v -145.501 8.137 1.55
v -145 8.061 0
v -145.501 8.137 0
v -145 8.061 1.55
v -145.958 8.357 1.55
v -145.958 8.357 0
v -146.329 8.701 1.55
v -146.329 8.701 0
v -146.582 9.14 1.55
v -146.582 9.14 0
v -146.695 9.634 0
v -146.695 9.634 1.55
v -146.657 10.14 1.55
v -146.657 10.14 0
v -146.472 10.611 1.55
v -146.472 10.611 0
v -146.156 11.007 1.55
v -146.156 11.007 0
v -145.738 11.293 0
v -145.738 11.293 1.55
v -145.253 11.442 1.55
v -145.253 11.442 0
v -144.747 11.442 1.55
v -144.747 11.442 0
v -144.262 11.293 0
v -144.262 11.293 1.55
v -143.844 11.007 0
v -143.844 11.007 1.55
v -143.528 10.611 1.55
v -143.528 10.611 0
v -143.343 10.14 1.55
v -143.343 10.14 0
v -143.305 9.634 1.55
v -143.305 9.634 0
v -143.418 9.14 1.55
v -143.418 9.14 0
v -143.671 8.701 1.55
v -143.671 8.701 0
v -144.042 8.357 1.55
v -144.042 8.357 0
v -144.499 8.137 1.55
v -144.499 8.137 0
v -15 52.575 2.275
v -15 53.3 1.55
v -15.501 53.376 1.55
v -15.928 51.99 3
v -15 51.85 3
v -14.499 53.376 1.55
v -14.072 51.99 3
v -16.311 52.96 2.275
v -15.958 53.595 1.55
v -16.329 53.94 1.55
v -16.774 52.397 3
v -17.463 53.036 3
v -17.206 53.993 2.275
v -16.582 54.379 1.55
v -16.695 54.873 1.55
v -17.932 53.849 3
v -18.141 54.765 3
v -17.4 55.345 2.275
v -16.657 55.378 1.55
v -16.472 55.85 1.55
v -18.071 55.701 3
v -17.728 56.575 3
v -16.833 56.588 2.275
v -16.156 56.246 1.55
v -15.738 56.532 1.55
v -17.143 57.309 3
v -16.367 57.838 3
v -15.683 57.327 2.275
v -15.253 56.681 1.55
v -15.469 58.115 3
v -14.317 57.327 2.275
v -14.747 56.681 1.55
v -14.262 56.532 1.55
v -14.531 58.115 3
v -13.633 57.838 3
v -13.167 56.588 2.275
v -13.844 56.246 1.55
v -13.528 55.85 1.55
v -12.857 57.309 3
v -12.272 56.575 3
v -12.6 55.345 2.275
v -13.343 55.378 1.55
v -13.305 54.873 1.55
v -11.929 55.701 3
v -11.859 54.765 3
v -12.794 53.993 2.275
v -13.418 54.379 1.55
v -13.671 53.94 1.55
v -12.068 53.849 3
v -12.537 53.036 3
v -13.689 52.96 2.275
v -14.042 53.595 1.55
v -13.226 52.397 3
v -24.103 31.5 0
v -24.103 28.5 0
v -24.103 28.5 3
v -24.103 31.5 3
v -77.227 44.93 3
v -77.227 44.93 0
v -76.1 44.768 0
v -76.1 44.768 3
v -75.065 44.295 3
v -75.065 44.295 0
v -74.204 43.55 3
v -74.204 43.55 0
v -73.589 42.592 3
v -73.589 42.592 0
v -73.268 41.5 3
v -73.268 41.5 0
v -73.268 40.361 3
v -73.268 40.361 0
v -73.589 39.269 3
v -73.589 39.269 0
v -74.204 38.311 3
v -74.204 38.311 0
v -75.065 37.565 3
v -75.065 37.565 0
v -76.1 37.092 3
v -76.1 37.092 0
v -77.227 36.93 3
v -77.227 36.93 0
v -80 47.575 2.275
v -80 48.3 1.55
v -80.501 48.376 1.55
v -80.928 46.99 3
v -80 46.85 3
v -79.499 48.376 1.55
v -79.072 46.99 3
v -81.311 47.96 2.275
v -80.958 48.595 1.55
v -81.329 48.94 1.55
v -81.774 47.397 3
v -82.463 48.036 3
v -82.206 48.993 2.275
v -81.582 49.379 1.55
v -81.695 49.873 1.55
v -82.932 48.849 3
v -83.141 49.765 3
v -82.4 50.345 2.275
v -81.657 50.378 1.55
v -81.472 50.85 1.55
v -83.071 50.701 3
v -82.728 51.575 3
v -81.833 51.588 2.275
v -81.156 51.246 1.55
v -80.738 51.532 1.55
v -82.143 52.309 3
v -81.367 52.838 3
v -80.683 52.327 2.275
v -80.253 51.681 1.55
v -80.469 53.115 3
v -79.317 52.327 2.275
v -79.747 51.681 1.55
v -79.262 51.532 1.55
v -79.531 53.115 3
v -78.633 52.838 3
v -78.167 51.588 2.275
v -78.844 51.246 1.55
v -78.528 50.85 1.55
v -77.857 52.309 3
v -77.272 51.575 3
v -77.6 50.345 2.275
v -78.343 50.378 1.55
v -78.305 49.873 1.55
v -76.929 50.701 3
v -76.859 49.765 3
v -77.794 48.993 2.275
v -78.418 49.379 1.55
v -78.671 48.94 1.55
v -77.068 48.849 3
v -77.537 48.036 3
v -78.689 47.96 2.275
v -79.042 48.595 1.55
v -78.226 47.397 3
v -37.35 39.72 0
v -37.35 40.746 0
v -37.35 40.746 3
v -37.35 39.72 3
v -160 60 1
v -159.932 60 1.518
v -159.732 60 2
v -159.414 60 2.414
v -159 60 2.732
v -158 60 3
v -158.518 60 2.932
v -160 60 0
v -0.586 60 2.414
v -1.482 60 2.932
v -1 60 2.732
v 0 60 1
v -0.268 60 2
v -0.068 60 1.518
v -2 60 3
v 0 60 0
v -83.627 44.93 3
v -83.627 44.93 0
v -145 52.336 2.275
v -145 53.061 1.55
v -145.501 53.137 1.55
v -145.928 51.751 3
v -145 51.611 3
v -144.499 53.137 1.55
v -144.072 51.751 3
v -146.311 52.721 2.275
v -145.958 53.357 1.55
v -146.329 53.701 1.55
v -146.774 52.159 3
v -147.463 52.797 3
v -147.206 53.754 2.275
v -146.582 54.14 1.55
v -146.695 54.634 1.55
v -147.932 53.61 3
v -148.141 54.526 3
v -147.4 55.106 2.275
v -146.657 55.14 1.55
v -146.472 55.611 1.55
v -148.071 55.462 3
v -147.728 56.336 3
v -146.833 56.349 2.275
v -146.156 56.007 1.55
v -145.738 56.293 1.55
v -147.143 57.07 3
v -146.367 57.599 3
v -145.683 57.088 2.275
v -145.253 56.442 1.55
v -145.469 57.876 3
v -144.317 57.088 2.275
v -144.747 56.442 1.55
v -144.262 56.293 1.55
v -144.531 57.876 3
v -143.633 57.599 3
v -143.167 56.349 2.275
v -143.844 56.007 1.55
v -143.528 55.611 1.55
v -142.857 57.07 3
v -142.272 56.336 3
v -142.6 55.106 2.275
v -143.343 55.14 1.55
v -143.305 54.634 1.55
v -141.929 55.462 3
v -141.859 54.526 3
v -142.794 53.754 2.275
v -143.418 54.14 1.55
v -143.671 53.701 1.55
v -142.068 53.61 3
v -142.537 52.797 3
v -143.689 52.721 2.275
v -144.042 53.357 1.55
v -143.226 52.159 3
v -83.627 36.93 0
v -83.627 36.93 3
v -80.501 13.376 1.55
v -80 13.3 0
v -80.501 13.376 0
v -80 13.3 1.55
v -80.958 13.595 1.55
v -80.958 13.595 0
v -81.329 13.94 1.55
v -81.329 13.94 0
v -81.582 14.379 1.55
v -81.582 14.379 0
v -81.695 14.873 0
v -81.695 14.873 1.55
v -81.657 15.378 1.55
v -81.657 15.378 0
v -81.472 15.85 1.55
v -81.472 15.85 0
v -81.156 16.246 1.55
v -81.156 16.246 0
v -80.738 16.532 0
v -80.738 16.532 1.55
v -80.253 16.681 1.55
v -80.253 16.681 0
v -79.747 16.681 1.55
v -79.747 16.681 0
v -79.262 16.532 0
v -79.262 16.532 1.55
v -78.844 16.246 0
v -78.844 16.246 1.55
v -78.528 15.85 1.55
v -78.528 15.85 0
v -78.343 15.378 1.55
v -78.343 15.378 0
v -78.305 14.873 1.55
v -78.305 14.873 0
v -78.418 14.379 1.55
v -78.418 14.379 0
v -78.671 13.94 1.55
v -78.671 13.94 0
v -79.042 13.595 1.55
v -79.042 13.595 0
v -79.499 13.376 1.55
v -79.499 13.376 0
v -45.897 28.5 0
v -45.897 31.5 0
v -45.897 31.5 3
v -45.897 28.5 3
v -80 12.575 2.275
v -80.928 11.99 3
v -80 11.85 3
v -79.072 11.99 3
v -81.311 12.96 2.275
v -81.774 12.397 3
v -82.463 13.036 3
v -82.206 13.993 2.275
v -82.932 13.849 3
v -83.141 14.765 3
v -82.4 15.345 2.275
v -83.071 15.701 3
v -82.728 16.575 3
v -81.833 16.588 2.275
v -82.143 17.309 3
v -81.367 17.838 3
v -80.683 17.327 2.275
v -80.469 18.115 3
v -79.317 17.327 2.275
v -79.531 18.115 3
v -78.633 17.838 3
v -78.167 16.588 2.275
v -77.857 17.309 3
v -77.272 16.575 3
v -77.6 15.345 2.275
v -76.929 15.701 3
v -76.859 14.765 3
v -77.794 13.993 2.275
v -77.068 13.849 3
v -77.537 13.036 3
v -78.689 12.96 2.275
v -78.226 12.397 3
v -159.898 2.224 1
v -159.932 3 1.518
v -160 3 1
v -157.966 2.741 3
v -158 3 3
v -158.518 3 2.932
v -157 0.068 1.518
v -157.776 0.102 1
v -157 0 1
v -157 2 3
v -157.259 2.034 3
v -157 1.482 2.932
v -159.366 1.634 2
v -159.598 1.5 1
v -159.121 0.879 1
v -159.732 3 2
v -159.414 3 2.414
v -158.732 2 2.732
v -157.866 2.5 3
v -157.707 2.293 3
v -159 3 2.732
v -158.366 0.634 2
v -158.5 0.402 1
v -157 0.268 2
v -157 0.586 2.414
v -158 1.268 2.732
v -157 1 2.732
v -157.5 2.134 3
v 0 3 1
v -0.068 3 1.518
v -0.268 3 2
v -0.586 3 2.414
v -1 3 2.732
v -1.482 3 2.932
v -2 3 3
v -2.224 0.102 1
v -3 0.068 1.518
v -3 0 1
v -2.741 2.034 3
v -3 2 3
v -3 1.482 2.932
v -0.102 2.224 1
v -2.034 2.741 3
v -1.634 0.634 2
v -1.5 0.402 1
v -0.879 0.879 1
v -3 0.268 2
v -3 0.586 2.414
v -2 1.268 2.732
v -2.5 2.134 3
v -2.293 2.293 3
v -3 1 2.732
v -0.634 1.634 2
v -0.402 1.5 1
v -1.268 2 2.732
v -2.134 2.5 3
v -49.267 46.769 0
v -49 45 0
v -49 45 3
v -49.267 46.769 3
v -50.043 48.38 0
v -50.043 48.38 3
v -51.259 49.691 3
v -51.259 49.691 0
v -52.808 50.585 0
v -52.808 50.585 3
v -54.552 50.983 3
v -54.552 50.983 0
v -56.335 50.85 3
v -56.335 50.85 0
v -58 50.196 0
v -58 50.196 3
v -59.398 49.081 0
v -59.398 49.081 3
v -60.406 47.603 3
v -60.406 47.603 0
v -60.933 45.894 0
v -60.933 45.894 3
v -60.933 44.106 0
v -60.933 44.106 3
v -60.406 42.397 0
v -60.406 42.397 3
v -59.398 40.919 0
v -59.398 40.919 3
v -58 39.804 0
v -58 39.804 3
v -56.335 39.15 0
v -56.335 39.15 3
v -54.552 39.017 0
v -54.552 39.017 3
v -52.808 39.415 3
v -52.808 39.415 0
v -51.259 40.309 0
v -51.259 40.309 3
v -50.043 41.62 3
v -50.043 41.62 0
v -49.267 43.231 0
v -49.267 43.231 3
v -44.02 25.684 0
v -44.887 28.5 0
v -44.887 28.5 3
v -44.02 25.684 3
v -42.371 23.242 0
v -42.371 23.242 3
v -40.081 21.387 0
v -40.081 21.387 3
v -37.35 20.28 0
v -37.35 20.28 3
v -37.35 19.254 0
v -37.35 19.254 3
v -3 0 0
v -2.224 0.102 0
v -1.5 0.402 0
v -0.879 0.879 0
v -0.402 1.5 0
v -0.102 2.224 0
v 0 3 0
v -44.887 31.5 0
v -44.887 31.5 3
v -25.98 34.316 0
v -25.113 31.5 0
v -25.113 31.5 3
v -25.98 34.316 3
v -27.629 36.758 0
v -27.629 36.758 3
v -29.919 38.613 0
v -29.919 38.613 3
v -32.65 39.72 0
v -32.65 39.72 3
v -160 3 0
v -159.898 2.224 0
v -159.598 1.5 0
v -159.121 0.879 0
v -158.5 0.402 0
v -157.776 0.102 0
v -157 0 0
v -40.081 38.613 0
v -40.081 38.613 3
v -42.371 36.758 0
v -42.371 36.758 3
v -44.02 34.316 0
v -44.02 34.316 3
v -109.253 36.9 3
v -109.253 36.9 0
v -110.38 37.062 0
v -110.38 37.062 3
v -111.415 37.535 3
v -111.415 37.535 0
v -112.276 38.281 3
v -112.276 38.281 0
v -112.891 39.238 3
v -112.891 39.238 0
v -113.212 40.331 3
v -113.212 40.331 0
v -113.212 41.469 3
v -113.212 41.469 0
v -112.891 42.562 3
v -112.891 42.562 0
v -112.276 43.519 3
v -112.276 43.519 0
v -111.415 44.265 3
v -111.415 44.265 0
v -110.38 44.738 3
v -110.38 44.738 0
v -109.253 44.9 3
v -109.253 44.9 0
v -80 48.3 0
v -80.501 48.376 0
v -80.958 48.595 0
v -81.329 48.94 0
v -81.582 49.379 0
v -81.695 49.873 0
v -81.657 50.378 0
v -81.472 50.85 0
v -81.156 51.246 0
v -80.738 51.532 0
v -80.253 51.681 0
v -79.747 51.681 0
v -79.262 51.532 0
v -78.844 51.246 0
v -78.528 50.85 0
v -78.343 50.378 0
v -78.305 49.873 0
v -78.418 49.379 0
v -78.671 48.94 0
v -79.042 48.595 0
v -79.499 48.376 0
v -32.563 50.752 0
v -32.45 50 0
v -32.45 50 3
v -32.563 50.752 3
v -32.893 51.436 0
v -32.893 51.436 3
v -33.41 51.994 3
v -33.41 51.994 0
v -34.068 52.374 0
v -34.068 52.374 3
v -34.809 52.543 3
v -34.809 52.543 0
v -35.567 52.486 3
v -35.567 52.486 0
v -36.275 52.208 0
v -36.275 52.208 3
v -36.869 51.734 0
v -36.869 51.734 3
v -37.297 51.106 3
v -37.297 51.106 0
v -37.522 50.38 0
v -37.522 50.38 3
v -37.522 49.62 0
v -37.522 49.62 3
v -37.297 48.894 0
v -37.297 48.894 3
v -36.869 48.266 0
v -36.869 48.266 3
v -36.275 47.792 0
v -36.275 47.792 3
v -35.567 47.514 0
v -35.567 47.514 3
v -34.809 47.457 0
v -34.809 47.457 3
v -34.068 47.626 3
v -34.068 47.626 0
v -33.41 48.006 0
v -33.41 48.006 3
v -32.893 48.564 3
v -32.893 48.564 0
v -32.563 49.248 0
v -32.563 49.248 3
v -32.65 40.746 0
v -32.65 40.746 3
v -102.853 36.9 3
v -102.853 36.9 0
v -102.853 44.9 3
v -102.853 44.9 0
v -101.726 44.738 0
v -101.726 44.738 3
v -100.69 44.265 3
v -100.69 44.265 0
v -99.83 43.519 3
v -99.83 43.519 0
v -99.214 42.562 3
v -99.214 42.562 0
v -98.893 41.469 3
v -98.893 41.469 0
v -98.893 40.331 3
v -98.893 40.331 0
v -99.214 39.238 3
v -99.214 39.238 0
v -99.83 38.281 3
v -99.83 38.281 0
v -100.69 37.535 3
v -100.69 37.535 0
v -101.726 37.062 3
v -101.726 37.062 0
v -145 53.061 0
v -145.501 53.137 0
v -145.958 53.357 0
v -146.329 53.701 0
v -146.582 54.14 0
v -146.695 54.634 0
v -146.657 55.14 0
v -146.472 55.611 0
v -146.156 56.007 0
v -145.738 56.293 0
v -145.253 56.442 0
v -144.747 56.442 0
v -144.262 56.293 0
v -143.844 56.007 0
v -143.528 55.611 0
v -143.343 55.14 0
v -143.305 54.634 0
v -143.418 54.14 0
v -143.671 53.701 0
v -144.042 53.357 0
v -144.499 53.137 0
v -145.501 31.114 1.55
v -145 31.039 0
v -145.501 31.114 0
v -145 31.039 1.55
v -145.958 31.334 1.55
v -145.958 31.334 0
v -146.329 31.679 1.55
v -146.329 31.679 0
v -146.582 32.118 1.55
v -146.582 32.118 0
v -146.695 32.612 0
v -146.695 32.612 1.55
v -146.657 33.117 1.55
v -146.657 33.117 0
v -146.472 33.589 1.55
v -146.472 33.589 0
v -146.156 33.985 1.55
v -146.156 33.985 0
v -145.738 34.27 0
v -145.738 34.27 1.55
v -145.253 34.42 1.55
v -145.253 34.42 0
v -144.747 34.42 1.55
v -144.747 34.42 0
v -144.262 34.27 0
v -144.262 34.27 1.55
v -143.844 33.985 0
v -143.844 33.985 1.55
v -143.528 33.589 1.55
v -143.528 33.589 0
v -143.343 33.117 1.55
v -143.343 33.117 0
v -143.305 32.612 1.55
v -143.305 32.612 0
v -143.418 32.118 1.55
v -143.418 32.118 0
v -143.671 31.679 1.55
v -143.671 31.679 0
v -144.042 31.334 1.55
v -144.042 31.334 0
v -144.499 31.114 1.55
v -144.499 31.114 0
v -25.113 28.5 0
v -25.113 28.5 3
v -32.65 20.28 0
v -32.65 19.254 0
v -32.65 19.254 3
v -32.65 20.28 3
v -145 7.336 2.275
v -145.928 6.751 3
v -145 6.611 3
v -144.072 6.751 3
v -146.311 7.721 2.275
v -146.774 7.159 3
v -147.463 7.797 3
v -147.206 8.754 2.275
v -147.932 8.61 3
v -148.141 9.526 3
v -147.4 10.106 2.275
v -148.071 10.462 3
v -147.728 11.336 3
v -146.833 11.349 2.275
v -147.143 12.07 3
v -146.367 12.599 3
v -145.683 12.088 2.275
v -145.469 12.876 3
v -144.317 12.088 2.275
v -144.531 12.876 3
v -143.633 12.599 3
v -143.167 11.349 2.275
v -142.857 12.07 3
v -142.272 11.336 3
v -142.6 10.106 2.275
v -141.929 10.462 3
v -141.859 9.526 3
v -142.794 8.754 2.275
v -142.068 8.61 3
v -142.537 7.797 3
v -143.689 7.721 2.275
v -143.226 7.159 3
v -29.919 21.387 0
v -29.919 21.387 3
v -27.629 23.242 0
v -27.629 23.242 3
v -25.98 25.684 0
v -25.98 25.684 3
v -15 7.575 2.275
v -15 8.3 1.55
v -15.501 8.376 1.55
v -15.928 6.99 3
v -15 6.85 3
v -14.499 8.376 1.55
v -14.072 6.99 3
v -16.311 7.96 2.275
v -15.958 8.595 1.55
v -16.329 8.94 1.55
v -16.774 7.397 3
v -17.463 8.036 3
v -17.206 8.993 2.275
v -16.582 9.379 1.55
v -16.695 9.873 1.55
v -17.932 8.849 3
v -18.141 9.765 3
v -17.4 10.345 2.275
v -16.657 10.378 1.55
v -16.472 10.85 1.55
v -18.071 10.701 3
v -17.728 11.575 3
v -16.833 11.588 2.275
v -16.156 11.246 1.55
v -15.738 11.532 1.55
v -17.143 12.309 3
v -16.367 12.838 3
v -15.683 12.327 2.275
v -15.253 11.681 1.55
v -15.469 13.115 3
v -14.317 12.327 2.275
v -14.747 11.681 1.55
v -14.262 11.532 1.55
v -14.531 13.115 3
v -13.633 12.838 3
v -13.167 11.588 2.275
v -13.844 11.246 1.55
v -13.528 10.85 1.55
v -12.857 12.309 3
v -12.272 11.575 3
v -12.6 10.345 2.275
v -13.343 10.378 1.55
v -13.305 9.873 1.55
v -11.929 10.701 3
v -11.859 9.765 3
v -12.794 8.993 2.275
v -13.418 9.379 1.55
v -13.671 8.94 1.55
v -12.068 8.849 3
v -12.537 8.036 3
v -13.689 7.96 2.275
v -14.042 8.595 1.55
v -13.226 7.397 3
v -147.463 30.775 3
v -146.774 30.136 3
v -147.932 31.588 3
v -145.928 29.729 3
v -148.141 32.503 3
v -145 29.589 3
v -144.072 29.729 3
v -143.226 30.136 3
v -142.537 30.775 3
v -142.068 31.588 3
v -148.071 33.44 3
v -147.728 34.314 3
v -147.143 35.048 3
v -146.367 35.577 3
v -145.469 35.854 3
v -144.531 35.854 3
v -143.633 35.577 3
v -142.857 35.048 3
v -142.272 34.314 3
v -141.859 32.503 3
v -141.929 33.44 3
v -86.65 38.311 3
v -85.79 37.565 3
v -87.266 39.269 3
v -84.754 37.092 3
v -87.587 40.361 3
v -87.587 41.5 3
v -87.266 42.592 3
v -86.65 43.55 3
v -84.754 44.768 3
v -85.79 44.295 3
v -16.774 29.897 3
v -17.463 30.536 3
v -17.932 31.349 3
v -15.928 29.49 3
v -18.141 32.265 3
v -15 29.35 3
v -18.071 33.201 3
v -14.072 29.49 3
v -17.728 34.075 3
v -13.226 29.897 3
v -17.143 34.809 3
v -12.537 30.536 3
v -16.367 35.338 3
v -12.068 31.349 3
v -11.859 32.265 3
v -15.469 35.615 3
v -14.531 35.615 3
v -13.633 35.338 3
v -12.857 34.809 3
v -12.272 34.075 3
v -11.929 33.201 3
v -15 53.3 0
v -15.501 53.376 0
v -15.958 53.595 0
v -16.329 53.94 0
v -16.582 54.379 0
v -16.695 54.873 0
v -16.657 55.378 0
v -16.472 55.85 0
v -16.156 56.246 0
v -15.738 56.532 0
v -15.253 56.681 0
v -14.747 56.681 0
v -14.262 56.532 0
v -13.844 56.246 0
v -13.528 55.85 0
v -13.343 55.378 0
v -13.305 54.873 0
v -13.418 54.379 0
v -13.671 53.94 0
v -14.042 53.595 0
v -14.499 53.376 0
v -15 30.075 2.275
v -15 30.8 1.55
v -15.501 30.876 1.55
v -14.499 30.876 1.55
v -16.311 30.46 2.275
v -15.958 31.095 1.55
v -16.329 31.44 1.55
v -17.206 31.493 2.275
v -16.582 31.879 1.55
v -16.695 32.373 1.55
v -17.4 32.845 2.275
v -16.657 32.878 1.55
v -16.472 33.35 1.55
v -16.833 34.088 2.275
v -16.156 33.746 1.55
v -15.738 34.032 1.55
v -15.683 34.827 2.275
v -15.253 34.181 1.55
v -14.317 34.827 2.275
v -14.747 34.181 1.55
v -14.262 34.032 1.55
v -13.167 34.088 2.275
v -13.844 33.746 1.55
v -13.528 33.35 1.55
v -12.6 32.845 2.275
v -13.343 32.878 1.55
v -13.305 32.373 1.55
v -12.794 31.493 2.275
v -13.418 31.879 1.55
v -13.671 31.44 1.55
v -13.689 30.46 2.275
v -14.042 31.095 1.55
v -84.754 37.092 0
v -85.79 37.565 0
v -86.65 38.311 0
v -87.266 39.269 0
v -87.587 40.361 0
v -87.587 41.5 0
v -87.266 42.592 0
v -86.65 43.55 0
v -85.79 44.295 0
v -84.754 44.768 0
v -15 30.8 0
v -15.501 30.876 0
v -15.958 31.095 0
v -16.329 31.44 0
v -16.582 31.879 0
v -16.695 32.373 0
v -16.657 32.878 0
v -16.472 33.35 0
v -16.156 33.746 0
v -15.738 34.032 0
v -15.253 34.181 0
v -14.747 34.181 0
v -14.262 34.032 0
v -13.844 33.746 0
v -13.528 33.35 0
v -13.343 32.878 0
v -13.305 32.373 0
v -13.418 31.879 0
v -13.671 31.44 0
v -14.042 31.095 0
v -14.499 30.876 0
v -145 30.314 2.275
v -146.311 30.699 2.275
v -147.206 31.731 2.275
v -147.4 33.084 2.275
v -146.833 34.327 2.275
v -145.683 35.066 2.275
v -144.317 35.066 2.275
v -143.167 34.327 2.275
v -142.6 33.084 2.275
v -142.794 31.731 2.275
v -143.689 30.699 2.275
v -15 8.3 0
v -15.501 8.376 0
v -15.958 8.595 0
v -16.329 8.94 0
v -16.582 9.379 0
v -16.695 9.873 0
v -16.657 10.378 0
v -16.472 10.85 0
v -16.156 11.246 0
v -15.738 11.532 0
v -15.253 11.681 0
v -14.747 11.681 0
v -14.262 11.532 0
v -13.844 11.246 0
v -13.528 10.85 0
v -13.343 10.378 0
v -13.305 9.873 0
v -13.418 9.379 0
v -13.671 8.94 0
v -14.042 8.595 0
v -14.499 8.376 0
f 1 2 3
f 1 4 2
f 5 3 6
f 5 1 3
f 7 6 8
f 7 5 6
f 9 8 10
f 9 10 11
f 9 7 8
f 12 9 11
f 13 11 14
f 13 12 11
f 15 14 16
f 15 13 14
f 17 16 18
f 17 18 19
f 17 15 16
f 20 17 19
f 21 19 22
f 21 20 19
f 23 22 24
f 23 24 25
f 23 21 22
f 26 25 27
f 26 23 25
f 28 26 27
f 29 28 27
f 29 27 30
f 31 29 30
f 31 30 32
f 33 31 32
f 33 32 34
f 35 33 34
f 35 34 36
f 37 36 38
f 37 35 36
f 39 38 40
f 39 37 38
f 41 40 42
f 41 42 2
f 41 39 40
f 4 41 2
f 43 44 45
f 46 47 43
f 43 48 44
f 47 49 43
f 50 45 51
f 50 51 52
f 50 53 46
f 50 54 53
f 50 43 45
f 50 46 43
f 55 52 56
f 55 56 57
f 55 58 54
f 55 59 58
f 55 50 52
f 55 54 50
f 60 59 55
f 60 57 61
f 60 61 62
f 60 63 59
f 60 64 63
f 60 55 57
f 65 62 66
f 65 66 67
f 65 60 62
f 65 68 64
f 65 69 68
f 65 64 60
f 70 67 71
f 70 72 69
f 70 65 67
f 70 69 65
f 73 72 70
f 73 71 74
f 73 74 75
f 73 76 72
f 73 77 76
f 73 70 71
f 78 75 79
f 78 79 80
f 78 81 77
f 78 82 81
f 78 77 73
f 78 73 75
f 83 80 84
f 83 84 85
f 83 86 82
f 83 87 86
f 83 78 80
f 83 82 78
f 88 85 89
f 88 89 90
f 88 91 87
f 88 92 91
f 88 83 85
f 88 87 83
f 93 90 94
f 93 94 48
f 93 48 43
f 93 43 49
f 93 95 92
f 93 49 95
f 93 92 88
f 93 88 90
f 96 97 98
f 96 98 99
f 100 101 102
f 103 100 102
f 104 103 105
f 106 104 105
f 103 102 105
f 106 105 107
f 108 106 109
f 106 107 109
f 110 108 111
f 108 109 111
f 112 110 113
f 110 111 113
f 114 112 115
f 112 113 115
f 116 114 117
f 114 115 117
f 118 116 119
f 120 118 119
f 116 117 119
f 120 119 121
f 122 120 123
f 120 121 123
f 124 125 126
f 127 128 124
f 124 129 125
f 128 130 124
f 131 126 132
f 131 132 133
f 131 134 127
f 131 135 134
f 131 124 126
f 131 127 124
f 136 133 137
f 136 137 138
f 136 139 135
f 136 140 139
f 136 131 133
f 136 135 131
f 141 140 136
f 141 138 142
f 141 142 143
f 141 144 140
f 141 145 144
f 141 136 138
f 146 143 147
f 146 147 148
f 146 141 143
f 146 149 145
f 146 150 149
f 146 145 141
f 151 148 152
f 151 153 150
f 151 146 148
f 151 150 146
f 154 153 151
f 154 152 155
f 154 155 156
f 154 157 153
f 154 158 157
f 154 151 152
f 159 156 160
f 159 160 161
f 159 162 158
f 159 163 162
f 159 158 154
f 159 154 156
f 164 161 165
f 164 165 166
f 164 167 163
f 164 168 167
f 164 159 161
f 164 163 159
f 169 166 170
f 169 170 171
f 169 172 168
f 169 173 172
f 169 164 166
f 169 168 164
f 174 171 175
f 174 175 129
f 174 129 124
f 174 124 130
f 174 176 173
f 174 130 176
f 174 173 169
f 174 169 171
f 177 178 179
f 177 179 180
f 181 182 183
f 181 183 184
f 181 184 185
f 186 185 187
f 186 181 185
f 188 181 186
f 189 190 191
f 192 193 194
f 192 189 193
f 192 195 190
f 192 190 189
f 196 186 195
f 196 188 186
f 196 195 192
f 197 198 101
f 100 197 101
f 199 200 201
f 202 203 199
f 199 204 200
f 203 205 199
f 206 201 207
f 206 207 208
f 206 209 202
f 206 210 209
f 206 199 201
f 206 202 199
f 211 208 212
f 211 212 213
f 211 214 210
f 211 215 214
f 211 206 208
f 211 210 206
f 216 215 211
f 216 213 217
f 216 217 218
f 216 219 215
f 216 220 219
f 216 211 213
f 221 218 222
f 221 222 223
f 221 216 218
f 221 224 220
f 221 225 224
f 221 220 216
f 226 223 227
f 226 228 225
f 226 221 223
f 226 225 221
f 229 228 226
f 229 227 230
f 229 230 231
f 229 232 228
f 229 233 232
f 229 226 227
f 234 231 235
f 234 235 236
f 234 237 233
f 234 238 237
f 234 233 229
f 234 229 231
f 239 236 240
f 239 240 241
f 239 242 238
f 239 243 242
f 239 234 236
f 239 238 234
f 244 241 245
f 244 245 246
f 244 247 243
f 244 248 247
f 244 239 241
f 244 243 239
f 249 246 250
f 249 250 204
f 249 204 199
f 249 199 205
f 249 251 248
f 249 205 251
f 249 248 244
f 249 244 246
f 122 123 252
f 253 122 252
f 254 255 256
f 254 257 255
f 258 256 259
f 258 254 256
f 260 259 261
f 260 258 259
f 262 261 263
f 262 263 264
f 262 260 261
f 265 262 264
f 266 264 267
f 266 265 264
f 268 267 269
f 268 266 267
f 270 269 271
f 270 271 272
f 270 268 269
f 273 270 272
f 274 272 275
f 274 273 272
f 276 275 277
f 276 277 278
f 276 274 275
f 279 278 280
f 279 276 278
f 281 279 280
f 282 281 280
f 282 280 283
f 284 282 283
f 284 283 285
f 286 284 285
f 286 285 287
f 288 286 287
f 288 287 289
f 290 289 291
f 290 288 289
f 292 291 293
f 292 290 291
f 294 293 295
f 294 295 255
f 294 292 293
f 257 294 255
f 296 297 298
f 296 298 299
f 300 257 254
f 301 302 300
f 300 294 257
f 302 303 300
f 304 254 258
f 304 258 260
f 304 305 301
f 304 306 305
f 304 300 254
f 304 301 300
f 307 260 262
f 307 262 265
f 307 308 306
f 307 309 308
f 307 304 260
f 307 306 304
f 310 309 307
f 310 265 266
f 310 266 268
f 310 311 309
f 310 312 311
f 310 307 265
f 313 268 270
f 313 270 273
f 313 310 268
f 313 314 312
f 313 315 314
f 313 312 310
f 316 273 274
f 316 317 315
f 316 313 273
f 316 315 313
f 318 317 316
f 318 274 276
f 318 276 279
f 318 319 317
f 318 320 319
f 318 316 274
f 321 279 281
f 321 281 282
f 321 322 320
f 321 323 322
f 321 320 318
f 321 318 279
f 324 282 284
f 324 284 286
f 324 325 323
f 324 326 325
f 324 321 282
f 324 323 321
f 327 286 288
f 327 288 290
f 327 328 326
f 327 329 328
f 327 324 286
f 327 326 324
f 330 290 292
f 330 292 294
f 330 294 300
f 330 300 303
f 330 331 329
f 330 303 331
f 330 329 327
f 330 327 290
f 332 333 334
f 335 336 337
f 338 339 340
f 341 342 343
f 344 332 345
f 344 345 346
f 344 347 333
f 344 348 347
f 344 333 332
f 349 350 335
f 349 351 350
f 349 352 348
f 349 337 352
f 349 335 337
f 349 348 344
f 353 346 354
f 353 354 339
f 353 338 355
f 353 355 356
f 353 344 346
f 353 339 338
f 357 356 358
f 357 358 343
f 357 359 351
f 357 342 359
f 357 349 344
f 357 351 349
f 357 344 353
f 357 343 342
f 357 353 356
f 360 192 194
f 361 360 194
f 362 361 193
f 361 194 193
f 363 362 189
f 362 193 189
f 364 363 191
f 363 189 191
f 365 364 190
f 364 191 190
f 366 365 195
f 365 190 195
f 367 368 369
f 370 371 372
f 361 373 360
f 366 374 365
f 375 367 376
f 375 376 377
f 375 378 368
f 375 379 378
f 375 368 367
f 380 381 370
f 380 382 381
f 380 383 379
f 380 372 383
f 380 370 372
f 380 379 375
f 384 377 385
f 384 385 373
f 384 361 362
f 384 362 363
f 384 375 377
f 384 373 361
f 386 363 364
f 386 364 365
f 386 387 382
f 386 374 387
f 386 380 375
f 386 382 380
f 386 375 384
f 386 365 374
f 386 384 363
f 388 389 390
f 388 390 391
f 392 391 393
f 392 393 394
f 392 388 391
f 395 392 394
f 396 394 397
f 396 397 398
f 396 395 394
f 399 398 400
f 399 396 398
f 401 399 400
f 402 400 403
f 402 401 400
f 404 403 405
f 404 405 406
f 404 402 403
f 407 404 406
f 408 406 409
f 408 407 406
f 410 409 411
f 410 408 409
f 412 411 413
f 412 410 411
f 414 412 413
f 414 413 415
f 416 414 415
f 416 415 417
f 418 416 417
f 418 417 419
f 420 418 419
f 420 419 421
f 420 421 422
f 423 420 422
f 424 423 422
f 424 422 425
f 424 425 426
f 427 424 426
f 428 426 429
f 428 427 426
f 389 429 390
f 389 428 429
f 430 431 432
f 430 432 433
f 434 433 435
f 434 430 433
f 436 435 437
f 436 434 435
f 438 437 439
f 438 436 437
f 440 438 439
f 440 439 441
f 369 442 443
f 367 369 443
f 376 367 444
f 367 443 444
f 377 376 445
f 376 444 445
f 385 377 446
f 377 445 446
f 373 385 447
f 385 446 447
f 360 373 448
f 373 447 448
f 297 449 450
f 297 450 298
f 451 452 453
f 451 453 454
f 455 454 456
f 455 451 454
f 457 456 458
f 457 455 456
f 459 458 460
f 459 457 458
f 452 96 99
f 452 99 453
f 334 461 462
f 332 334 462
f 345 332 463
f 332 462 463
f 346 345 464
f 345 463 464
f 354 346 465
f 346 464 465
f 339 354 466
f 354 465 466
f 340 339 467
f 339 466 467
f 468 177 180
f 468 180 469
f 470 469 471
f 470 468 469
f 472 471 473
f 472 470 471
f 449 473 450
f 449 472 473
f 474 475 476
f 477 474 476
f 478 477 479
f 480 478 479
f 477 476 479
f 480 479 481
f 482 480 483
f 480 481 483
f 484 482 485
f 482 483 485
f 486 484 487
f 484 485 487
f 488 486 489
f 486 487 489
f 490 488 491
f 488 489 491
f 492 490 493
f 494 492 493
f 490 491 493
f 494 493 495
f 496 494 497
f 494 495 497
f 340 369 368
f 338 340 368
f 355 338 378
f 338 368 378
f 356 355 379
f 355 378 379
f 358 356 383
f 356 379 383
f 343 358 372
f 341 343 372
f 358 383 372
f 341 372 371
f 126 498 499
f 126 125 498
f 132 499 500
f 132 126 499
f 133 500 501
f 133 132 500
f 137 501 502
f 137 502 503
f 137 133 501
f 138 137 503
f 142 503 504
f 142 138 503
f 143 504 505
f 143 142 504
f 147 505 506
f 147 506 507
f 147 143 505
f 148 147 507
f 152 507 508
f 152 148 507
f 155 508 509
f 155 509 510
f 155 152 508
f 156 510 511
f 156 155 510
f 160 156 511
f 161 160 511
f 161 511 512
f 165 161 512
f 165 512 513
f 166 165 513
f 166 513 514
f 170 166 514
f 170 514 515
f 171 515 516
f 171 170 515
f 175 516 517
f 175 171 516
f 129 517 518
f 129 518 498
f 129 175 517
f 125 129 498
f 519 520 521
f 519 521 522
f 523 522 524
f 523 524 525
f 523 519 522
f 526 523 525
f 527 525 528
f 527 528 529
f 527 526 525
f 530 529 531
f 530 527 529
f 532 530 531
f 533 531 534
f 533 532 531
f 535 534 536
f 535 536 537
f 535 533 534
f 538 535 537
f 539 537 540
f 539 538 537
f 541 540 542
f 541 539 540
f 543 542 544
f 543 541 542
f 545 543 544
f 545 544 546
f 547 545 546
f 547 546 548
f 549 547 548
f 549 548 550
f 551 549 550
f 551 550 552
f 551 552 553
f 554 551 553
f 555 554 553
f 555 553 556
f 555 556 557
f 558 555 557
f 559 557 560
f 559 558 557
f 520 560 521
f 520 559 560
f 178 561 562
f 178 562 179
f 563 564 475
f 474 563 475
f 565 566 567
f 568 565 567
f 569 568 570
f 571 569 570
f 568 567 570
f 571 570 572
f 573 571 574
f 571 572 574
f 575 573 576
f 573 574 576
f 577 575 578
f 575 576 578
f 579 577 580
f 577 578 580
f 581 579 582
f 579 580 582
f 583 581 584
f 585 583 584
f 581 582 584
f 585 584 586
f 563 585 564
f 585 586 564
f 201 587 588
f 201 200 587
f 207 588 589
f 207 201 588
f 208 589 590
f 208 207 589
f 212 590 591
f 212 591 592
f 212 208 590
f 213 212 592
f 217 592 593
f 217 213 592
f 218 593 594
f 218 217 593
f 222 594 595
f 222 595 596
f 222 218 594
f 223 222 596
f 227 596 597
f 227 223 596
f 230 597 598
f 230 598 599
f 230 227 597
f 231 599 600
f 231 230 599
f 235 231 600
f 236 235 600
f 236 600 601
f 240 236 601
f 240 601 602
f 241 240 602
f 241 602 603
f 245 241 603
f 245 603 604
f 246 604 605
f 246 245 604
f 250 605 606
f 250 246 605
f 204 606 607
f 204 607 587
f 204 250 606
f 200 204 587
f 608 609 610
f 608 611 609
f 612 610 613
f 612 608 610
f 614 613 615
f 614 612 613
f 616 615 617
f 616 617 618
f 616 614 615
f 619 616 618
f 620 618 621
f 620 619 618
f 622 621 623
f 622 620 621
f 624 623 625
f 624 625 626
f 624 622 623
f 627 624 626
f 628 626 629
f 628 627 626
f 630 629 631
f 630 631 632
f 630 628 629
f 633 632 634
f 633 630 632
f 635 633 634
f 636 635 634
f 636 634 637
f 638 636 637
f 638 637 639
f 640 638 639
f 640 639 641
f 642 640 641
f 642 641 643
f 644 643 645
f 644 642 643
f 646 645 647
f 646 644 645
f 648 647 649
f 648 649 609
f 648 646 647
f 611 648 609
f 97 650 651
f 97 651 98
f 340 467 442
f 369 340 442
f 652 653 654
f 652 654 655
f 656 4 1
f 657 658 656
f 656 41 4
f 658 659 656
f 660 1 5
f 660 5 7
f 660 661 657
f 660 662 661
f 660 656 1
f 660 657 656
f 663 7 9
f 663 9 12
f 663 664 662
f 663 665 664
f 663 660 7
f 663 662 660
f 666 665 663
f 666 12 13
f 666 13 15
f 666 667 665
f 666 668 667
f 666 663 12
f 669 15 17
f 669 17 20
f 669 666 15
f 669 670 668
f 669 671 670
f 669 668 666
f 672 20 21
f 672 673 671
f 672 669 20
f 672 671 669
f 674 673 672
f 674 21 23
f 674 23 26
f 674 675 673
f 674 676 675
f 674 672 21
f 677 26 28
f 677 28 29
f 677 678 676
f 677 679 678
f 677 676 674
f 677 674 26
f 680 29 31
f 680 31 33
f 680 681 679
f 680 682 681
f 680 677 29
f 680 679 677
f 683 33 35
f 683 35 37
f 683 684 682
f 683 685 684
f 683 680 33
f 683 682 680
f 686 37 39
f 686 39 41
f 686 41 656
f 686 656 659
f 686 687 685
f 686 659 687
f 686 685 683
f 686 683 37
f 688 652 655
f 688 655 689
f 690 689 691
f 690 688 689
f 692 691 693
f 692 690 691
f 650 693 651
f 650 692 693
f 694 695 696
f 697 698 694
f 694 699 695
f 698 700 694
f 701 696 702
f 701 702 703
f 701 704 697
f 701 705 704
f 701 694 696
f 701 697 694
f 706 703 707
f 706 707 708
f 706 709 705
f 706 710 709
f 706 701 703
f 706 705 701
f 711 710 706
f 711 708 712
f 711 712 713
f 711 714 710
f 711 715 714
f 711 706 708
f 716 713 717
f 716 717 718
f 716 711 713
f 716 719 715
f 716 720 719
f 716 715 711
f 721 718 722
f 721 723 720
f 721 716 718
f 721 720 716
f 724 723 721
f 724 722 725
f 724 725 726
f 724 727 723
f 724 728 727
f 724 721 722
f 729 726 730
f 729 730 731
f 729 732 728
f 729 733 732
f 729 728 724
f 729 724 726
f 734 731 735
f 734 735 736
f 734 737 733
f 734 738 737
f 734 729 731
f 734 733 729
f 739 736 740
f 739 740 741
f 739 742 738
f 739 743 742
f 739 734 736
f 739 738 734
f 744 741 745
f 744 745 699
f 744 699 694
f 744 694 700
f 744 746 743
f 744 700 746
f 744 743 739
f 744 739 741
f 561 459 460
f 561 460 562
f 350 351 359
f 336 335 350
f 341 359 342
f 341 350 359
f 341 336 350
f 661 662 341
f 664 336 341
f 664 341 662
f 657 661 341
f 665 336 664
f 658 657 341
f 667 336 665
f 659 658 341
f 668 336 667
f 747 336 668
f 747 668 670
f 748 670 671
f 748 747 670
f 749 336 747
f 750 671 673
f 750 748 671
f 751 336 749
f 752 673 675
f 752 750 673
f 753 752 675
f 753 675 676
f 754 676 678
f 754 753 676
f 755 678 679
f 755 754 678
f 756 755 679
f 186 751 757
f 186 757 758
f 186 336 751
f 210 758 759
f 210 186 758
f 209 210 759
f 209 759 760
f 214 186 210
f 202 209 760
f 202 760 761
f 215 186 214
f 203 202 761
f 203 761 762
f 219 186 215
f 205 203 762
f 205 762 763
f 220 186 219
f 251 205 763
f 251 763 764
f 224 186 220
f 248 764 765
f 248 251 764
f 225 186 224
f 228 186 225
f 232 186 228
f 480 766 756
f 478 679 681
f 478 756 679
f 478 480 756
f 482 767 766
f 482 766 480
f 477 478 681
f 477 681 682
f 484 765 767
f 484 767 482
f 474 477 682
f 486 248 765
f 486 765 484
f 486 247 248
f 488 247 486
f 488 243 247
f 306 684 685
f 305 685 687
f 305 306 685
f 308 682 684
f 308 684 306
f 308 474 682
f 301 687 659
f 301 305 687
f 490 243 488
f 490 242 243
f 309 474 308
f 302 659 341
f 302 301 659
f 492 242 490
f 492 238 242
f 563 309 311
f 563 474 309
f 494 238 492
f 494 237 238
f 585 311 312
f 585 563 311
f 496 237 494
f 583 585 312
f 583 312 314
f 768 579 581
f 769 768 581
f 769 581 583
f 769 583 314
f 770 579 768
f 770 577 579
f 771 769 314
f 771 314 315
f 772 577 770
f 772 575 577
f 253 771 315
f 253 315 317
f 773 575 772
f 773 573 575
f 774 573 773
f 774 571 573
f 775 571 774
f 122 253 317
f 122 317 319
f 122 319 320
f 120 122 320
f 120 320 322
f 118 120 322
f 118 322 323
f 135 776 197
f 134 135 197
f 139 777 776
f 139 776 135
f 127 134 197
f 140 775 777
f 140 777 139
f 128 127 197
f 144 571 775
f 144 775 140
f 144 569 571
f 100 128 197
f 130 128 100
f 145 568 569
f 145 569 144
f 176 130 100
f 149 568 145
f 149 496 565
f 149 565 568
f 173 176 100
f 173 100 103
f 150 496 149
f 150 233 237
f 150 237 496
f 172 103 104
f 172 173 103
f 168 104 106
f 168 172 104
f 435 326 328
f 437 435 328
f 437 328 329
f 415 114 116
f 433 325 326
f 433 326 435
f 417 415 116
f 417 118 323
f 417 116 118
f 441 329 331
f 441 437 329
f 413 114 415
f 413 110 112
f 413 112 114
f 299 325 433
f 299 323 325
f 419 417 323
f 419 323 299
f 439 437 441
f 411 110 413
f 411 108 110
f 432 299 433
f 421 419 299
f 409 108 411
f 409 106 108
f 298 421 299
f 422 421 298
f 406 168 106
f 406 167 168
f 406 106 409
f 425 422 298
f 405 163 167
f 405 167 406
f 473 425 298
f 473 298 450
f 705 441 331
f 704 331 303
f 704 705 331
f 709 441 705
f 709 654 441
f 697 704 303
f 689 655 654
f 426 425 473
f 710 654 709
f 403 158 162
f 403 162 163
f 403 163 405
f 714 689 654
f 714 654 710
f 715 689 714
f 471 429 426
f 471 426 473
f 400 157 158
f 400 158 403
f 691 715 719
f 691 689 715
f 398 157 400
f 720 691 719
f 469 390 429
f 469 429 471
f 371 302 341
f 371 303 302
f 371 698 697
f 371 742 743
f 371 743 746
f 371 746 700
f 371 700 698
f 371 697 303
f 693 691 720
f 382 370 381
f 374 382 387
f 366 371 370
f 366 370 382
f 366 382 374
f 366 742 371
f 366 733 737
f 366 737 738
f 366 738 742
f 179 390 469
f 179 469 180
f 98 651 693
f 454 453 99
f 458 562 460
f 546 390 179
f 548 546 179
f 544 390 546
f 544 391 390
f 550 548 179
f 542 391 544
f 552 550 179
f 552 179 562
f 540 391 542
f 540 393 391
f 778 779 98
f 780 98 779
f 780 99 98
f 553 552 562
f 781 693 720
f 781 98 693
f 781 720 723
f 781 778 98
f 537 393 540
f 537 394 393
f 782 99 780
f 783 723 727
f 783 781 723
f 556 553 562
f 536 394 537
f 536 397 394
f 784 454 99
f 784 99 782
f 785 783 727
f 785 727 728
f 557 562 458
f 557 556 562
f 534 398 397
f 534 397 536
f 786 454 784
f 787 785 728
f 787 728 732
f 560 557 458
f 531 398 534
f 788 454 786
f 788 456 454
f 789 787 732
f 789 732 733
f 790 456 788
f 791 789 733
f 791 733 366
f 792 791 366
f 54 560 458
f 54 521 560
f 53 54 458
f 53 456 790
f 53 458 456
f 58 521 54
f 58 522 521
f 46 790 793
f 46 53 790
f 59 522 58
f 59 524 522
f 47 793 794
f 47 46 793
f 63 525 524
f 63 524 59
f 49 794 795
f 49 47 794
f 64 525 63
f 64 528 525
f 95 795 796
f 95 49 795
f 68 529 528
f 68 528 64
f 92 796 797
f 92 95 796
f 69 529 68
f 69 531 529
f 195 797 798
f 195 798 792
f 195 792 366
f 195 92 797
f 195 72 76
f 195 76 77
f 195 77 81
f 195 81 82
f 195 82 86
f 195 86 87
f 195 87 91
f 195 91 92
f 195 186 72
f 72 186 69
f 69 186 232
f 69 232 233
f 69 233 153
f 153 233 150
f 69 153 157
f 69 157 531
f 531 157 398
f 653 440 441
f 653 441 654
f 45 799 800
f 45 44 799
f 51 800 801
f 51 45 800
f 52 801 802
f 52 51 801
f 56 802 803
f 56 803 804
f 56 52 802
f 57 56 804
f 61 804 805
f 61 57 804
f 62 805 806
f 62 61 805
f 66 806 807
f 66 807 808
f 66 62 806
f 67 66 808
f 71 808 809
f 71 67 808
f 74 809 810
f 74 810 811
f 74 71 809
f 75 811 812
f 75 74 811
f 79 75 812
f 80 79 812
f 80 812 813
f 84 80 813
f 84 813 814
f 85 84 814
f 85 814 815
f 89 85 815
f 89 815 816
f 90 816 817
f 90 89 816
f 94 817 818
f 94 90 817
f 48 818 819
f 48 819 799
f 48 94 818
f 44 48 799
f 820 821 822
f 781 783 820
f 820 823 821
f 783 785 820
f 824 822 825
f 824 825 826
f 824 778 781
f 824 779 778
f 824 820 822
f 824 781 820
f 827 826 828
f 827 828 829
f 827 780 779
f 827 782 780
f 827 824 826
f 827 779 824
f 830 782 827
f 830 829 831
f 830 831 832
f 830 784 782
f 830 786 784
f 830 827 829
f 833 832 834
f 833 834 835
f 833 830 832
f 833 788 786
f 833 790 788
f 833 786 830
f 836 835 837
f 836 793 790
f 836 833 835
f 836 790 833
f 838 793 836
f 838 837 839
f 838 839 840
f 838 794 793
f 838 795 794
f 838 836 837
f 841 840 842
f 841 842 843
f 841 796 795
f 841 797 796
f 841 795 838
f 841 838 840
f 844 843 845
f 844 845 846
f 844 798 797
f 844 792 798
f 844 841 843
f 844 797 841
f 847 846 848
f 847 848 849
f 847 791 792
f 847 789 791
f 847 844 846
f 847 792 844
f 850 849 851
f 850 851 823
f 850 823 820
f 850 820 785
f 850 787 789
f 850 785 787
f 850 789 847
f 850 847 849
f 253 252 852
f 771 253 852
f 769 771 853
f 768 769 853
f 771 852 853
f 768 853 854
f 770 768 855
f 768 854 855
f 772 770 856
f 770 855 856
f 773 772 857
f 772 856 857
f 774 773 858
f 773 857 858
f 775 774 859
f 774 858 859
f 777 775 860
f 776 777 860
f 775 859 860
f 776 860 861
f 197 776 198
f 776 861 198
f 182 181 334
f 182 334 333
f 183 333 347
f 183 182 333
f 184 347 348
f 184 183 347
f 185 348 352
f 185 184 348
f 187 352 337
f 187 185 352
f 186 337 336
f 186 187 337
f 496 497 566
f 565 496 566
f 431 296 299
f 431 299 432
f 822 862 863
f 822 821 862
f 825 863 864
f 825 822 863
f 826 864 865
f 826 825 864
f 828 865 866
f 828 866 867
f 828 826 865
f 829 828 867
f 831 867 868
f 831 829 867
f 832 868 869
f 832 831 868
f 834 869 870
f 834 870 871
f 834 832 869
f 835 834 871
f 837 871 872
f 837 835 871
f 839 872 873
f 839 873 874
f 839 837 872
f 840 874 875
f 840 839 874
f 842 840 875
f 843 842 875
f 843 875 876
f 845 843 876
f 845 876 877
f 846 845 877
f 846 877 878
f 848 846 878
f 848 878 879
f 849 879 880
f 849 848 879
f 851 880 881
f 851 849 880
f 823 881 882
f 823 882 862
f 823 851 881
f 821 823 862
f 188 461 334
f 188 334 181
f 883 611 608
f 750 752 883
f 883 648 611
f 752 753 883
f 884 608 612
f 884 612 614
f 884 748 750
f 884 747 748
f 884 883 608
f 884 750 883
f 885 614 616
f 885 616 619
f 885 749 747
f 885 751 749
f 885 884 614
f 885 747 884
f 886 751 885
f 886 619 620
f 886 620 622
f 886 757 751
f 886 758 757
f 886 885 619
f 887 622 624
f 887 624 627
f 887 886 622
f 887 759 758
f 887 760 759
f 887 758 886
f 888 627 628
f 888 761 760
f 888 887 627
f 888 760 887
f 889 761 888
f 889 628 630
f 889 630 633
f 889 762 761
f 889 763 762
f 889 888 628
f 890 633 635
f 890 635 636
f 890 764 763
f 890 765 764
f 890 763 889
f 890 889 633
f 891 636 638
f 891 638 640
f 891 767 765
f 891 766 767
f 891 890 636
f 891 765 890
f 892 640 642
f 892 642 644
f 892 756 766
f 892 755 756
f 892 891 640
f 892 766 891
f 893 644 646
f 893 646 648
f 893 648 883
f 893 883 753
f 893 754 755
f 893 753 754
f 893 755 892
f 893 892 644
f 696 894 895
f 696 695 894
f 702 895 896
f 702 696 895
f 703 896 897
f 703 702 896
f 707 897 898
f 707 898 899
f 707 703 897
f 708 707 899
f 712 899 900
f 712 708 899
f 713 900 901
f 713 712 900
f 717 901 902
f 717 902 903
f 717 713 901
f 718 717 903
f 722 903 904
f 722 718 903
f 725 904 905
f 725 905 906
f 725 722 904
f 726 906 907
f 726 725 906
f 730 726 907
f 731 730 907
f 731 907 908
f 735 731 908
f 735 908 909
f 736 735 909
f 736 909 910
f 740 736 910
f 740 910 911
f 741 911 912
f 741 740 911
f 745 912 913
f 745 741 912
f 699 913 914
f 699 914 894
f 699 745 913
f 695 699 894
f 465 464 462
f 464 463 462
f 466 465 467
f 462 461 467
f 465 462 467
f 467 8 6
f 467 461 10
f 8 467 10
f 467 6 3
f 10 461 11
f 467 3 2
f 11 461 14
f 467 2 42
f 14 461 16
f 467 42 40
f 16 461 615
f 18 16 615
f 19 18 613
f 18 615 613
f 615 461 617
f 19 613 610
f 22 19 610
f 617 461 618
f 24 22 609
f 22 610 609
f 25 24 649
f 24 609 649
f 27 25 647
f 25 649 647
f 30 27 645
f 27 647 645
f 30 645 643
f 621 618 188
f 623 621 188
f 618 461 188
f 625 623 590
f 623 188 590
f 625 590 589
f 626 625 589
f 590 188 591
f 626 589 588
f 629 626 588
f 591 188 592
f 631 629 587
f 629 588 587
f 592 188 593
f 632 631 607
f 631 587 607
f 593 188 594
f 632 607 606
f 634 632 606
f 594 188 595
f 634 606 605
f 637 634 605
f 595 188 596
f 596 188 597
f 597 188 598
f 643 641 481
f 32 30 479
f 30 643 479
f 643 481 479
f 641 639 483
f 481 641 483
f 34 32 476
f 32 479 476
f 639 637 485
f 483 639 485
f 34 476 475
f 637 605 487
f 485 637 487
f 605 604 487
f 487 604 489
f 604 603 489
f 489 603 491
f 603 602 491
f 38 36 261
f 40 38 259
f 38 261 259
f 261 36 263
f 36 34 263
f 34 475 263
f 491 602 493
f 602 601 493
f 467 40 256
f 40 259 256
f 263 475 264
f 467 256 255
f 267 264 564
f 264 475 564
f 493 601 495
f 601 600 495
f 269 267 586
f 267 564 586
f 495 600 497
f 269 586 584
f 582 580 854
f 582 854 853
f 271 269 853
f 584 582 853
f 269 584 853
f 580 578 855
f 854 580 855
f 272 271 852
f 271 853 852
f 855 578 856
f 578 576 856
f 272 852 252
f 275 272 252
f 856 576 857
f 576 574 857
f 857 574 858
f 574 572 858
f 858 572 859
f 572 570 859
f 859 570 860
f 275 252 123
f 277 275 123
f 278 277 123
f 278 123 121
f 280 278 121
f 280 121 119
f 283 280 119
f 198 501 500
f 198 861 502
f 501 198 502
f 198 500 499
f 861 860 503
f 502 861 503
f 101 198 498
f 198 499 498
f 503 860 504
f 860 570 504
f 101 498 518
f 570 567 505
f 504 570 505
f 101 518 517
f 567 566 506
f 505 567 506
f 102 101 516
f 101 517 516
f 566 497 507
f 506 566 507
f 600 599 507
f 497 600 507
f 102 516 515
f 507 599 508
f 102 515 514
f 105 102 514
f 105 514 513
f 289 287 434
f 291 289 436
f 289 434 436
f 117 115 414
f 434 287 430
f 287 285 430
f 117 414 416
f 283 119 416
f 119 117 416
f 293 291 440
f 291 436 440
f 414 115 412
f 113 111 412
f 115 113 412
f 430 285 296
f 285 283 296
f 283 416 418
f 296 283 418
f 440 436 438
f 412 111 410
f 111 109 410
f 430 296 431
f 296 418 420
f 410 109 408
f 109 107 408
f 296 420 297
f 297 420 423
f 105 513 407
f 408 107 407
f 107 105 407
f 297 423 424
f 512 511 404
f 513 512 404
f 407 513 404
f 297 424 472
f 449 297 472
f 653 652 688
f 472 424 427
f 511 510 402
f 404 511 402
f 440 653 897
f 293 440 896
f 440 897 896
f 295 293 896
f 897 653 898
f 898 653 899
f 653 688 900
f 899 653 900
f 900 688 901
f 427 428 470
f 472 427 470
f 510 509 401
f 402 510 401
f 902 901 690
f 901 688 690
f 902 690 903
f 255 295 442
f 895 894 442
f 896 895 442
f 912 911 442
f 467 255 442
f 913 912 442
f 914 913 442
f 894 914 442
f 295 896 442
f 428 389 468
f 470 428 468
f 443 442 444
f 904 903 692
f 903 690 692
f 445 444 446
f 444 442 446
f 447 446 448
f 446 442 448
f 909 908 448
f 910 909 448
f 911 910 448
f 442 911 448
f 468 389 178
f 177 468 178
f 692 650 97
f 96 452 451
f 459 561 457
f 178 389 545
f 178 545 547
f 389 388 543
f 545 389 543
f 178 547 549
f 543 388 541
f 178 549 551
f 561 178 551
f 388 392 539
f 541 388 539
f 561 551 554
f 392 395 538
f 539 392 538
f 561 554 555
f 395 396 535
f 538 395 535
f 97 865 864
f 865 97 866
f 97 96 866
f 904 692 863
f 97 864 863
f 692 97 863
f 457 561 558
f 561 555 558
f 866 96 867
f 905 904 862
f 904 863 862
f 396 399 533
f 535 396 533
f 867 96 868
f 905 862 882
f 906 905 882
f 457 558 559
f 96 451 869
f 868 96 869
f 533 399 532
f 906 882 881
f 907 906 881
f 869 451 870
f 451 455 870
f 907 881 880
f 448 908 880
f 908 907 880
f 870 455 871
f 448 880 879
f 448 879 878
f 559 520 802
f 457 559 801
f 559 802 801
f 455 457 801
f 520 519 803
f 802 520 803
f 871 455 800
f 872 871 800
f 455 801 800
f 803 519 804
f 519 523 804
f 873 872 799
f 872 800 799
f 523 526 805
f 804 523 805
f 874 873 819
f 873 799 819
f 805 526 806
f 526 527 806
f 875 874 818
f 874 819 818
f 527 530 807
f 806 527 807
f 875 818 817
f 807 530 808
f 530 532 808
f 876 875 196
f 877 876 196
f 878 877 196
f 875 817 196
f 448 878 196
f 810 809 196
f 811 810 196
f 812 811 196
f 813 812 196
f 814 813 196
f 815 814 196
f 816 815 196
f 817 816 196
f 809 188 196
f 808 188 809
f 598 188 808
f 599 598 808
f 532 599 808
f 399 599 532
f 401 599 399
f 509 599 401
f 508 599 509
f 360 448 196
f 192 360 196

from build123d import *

# Parameters (mm, degrees)
SKETCH11_W                                     = 160
SKETCH11_H                                     = 60
SKETCH11_R                                     = 2.55
SKETCH11_R_2                                   = 6
BOSS_EXTRUDE1_DEPTH                            = 3
FILLET1_R                                      = 2
FILLET3_R                                      = 3
CSK_FOR_M3_FLAT_HEAD_MACHINE_SCREW1_AT_2_COUNT = 2
CSK_FOR_M3_FLAT_HEAD_MACHINE_SCREW1_AT_2_PITCH = 22.022525482
CSK_FOR_M3_FLAT_HEAD_MACHINE_SCREW1_AT_3_COUNT = 2
CSK_FOR_M3_FLAT_HEAD_MACHINE_SCREW1_AT_3_PITCH = 45
CSK_FOR_M3_FLAT_HEAD_MACHINE_SCREW1_AT_4_COUNT = 2
CSK_FOR_M3_FLAT_HEAD_MACHINE_SCREW1_AT_4_PITCH = 137.490256535
CSK_FOR_M3_FLAT_HEAD_MACHINE_SCREW1_AT_5_COUNT = 2
CSK_FOR_M3_FLAT_HEAD_MACHINE_SCREW1_AT_5_PITCH = 131.892243209
CSK_FOR_M3_FLAT_HEAD_MACHINE_SCREW1_AT_6_COUNT = 2
CSK_FOR_M3_FLAT_HEAD_MACHINE_SCREW1_AT_6_PITCH = 130.000219213
CSK_FOR_M3_FLAT_HEAD_MACHINE_SCREW1_AT_7_COUNT = 2
CSK_FOR_M3_FLAT_HEAD_MACHINE_SCREW1_AT_7_PITCH = 65.174148425
CSK_FOR_M3_FLAT_HEAD_MACHINE_SCREW1_AT_8_COUNT = 2
CSK_FOR_M3_FLAT_HEAD_MACHINE_SCREW1_AT_8_PITCH = 76.196837301


with BuildPart() as part:
    # Sketch11 → Boss-Extrude1 (new body)
    with BuildSketch(Plane.XY):
        with Locations((-80, 30)):
            Rectangle(SKETCH11_W, SKETCH11_H)
        with Locations((-35, 50)):
            Circle(SKETCH11_R, mode=Mode.SUBTRACT)
        with Locations((-55, 45)):
            Circle(SKETCH11_R_2, mode=Mode.SUBTRACT)
        with BuildLine():
            Line((-44.886859967, 31.5), (-45.897247359, 31.5))
            Line((-45.897247359, 31.5), (-45.897247359, 28.5))
            Line((-45.897247359, 28.5), (-44.886859967, 28.5))
            ThreePointArc((-44.886859967, 28.5), (-42.370691635, 23.241826814), (-37.35, 20.280046296))
            Line((-37.35, 20.280046296), (-37.35, 19.253954216))
            Line((-37.35, 19.253954216), (-32.65, 19.253954216))
            Line((-32.65, 19.253954216), (-32.65, 20.280046296))
            ThreePointArc((-32.65, 20.280046296), (-27.629308365, 23.241826814), (-25.113140033, 28.5))
            Line((-25.113140033, 28.5), (-24.102752641, 28.5))
            Line((-24.102752641, 28.5), (-24.102752641, 31.5))
            Line((-24.102752641, 31.5), (-25.113140033, 31.5))
            ThreePointArc((-25.113140033, 31.5), (-27.629308365, 36.758173186), (-32.65, 39.719953704))
            Line((-32.65, 39.719953704), (-32.65, 40.746045784))
            Line((-32.65, 40.746045784), (-37.35, 40.746045784))
            Line((-37.35, 40.746045784), (-37.35, 39.719953704))
            ThreePointArc((-37.35, 39.719953704), (-42.370691635, 36.758173186), (-44.886859967, 31.5))
        make_face(mode=Mode.SUBTRACT)
        with BuildLine():
            Line((-83.627304882, 44.930328357), (-77.227304882, 44.930328357))
            ThreePointArc((-77.227304882, 44.930328357), (-73.227304882, 40.930328357), (-77.227304882, 36.930328357))
            Line((-77.227304882, 36.930328357), (-83.627304882, 36.930328357))
            ThreePointArc((-83.627304882, 36.930328357), (-87.627304882, 40.930328357), (-83.627304882, 44.930328357))
        make_face(mode=Mode.SUBTRACT)
        with BuildLine():
            Line((-109.252753418, 44.9), (-102.852753418, 44.9))
            ThreePointArc((-102.852753418, 44.9), (-98.852753418, 40.9), (-102.852753418, 36.9))
            Line((-102.852753418, 36.9), (-109.252753418, 36.9))
            ThreePointArc((-109.252753418, 36.9), (-113.252753418, 40.9), (-109.252753418, 44.9))
        make_face(mode=Mode.SUBTRACT)
    extrude(amount=BOSS_EXTRUDE1_DEPTH)

    # Fillet1
    fillet1_edges = [part.edges().sort_by_distance(p)[0] for p in [
        (-160, 30, 3),
        (-80, 0, 3),
        (0, 30, 3),
    ]]
    fillet(fillet1_edges, radius=FILLET1_R)

    # Fillet3
    # the kernel refuses this fillet: 3 mm, written as the material it takes off along each edge
    with BuildSketch(Plane(origin=(-3, 3, 3), x_dir=(0, -1, 0), z_dir=(-1, 0, 0))) as fillet3_piece_1:
        with BuildLine():
            CenterArc((1, -2), 2, 0, 90)
            Line((3, -2), (3, 0))
            Line((3, 0), (1, 0))
        make_face()
    revolve(axis=Axis((-3, 3, 3), (0, 0, 1)), revolution_arc=90, mode=Mode.SUBTRACT)
    with BuildSketch(Plane(origin=(-157, 3, 3), x_dir=(-1, 0, 0), z_dir=(0, 1, 0))) as fillet3_piece_2:
        with BuildLine():
            CenterArc((1, -2), 2, 0, 90)
            Line((3, -2), (3, 0))
            Line((3, 0), (1, 0))
        make_face()
    revolve(axis=Axis((-157, 3, 3), (0, 0, 1)), revolution_arc=90, mode=Mode.SUBTRACT)
    with BuildSketch(Plane(origin=(0, 0, -7.5), x_dir=(-1, 0, 0), z_dir=(0, 0, 1))) as fillet3_piece_3:
        with BuildLine():
            CenterArc((FILLET3_R, -FILLET3_R), FILLET3_R, 90, 90)
            Line((0, -FILLET3_R), (0, 0))
            Line((0, 0), (FILLET3_R, 0))
        make_face()
    extrude(amount=10.5, mode=Mode.SUBTRACT)
    with BuildSketch(Plane(origin=(-160, 0, -7.5), x_dir=(1, 0, 0), z_dir=(0, 0, 1))) as fillet3_piece_4:
        with BuildLine():
            CenterArc((FILLET3_R, FILLET3_R), FILLET3_R, 180, 90)
            Line((0, FILLET3_R), (0, 0))
            Line((0, 0), (FILLET3_R, 0))
        make_face()
    extrude(amount=10.5, mode=Mode.SUBTRACT)

    # Sketch13 → CSK for M3 Flat Head Machine Screw1 (revolve, cut)
    with BuildSketch(Plane(origin=(-145, 54.761262741, 3), x_dir=(0, -1, 0), z_dir=(1, 0, 0))):
        Polygon((0, 0), (0, 3), (1.7, 3), (1.7, 1.45), (3.15, 0), align=None)
    csk_for_m3_flat_head_machine_screw1 = revolve(axis=Axis((-145, 54.761262741, 9.35), (0, 0, -1)), mode=Mode.SUBTRACT)

    # CSK for M3 Flat Head Machine Screw1 at 2: CSK for M3 Flat Head Machine Screw1 ×2
    with Locations(*[(0, -i * CSK_FOR_M3_FLAT_HEAD_MACHINE_SCREW1_AT_2_PITCH, 0) for i in range(1, CSK_FOR_M3_FLAT_HEAD_MACHINE_SCREW1_AT_2_COUNT)]):
        add(csk_for_m3_flat_head_machine_screw1, mode=Mode.SUBTRACT)

    # CSK for M3 Flat Head Machine Screw1 at 3: CSK for M3 Flat Head Machine Screw1 ×2
    with Locations(*[(0, -i * CSK_FOR_M3_FLAT_HEAD_MACHINE_SCREW1_AT_3_PITCH, 0) for i in range(1, CSK_FOR_M3_FLAT_HEAD_MACHINE_SCREW1_AT_3_COUNT)]):
        add(csk_for_m3_flat_head_machine_screw1, mode=Mode.SUBTRACT)

    # CSK for M3 Flat Head Machine Screw1 at 4: CSK for M3 Flat Head Machine Screw1 ×2
    with Locations(*[Vector(0.9455215465875816, -0.3255595259528246, 0) * (i * CSK_FOR_M3_FLAT_HEAD_MACHINE_SCREW1_AT_4_PITCH) for i in range(1, CSK_FOR_M3_FLAT_HEAD_MACHINE_SCREW1_AT_4_COUNT)]):
        add(csk_for_m3_flat_head_machine_screw1, mode=Mode.SUBTRACT)

    # CSK for M3 Flat Head Machine Screw1 at 5: CSK for M3 Flat Head Machine Screw1 ×2
    with Locations(*[Vector(0.9856531122424032, -0.16878371463759412, 0) * (i * CSK_FOR_M3_FLAT_HEAD_MACHINE_SCREW1_AT_5_PITCH) for i in range(1, CSK_FOR_M3_FLAT_HEAD_MACHINE_SCREW1_AT_5_COUNT)]):
        add(csk_for_m3_flat_head_machine_screw1, mode=Mode.SUBTRACT)

    # CSK for M3 Flat Head Machine Screw1 at 6: CSK for M3 Flat Head Machine Screw1 ×2
    with Locations(*[Vector(0.9999983137474917, 0.0018364373589019598, 0) * (i * CSK_FOR_M3_FLAT_HEAD_MACHINE_SCREW1_AT_6_PITCH) for i in range(1, CSK_FOR_M3_FLAT_HEAD_MACHINE_SCREW1_AT_6_COUNT)]):
        add(csk_for_m3_flat_head_machine_screw1, mode=Mode.SUBTRACT)

    # CSK for M3 Flat Head Machine Screw1 at 7: CSK for M3 Flat Head Machine Screw1 ×2
    with Locations(*[Vector(0.9973279524332378, -0.0730544680038502, 0) * (i * CSK_FOR_M3_FLAT_HEAD_MACHINE_SCREW1_AT_7_PITCH) for i in range(1, CSK_FOR_M3_FLAT_HEAD_MACHINE_SCREW1_AT_7_COUNT)]):
        add(csk_for_m3_flat_head_machine_screw1, mode=Mode.SUBTRACT)

    # CSK for M3 Flat Head Machine Screw1 at 8: CSK for M3 Flat Head Machine Screw1 ×2
    with Locations(*[Vector(0.8530537788971958, -0.5218230066882967, 0) * (i * CSK_FOR_M3_FLAT_HEAD_MACHINE_SCREW1_AT_8_PITCH) for i in range(1, CSK_FOR_M3_FLAT_HEAD_MACHINE_SCREW1_AT_8_COUNT)]):
        add(csk_for_m3_flat_head_machine_screw1, mode=Mode.SUBTRACT)


solid = part.part
